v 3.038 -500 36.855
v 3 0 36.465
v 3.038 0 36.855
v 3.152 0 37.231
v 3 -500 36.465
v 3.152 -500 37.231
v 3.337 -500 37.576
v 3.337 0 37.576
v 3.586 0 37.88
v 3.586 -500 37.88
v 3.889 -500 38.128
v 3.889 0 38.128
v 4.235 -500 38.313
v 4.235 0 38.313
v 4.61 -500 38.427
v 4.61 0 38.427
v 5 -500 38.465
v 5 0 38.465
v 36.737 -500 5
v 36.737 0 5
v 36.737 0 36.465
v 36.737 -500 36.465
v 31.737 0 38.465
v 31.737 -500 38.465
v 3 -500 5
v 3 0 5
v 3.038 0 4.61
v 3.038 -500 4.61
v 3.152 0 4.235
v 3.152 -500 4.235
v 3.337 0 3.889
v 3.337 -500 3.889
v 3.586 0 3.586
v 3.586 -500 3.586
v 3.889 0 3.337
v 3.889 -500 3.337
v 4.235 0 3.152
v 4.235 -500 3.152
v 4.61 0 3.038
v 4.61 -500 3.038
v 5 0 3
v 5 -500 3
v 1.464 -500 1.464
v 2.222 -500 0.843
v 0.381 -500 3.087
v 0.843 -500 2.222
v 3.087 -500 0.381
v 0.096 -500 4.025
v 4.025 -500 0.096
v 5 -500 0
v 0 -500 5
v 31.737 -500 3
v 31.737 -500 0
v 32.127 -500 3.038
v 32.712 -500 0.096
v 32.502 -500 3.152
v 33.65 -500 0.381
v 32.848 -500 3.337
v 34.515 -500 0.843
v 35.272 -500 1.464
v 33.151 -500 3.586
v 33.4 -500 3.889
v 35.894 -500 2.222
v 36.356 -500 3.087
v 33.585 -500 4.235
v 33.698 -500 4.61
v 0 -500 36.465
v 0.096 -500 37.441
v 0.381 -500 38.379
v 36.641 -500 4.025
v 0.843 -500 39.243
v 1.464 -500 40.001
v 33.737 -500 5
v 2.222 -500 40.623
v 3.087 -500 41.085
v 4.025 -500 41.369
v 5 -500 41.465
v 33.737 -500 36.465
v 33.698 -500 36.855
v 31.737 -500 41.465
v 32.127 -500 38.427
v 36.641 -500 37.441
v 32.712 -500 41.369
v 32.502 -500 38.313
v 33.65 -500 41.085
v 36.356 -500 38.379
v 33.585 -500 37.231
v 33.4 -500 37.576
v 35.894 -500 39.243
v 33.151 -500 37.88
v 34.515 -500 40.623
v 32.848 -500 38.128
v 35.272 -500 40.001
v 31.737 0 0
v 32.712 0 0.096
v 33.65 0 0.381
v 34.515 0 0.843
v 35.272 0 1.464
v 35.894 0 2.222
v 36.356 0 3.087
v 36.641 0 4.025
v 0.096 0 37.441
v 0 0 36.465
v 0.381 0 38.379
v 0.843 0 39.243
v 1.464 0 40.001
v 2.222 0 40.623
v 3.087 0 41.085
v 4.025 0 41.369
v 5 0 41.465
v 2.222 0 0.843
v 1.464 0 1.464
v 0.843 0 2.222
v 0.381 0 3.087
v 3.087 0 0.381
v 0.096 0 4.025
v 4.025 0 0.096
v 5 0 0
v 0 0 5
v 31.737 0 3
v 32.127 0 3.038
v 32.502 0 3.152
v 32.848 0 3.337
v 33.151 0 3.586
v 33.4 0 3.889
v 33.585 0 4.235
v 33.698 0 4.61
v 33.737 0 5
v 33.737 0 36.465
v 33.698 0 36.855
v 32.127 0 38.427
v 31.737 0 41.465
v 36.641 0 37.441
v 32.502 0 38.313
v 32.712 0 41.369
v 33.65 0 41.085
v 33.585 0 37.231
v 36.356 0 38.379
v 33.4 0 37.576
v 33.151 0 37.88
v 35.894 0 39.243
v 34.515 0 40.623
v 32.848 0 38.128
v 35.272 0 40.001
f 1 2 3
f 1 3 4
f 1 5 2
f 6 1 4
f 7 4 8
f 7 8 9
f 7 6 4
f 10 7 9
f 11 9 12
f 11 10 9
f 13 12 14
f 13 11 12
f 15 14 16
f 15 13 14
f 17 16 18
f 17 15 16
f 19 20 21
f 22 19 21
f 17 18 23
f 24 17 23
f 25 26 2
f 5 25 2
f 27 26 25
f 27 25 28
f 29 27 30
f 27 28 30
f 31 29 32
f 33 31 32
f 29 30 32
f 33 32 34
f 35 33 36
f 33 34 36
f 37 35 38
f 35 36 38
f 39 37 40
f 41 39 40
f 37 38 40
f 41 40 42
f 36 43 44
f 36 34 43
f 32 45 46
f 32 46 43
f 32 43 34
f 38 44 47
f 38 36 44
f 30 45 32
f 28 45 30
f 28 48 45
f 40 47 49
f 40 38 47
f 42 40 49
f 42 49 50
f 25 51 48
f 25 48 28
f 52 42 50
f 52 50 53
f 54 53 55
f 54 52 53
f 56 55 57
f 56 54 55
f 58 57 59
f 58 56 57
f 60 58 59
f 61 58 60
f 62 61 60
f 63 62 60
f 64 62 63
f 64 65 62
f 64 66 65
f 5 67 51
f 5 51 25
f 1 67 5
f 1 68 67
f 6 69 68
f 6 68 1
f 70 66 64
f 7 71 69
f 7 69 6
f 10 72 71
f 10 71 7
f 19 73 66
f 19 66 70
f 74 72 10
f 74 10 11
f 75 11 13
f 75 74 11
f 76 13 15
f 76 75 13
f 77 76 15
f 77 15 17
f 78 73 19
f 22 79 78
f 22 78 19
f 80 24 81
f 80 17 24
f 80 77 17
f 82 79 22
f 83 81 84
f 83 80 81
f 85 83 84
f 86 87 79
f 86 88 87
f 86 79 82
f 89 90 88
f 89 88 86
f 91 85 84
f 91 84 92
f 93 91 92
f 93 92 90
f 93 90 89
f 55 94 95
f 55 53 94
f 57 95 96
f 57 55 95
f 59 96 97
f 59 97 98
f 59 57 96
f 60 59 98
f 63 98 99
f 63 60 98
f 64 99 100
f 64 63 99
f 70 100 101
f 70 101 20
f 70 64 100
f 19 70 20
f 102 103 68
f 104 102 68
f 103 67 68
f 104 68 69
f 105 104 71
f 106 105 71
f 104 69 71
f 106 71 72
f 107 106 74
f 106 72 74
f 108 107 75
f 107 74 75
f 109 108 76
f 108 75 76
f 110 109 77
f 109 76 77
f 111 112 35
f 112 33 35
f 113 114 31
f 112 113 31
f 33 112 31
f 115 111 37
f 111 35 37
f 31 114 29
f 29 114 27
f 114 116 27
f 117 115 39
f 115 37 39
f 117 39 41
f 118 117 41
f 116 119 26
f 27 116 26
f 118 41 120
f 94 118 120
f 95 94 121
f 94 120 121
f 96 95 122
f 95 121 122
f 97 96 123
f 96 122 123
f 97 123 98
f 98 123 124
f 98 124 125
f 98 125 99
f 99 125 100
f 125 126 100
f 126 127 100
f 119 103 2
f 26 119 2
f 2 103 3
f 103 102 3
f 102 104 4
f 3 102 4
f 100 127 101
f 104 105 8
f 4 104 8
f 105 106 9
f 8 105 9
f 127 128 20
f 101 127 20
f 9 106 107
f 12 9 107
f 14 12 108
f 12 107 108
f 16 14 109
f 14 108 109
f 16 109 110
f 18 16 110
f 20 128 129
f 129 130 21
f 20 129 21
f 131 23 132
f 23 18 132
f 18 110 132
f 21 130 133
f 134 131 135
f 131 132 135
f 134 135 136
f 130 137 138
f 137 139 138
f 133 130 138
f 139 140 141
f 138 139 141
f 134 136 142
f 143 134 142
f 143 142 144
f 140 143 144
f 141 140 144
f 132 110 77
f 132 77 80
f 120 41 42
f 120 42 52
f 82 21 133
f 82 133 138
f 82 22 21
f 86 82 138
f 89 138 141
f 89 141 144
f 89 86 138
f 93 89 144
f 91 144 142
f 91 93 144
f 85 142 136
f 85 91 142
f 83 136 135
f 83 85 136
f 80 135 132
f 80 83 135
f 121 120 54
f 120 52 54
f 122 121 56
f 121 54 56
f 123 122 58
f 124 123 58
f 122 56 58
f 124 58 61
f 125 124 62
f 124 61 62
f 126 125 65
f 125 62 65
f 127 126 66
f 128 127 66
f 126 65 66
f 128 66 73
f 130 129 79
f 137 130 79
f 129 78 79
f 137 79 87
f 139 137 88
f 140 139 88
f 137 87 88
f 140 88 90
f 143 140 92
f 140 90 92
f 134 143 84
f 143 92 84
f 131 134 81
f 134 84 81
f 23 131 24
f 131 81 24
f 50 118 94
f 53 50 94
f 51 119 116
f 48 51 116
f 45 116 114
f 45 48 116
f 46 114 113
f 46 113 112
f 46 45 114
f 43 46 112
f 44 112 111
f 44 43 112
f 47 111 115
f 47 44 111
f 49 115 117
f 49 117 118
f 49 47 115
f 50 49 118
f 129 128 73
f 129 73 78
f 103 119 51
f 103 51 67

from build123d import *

# Parameters (mm, degrees)
F0_W     = 36.736786
F0_H     = 41.465297
F1_DEPTH = 500
F2_R     = 5
F3_T     = -3


with BuildPart() as f1:
    # F0 (on Front) → F1 (new body)
    with BuildSketch(Plane.XZ):
        with Locations((18.368393, 20.732648)):
            Rectangle(F0_W, F0_H)
    extrude(amount=F1_DEPTH)

    # F2
    f2_edges = [f1.edges().sort_by_distance(p)[0] for p in [
        (36.736786, -250, 41.465297),
        (0, -250, 41.465297),
        (36.736786, -250, 0),
        (0, -250, 0),
    ]]
    fillet(f2_edges, radius=F2_R)

    # F3
    f3_openings = [f1.faces().sort_by_distance(p)[0] for p in [
        (18.368393, -500, 20.732649),
        (18.368393, 0, 20.732649),
    ]]
    offset(amount=F3_T, openings=f3_openings)


solid = f1.part
